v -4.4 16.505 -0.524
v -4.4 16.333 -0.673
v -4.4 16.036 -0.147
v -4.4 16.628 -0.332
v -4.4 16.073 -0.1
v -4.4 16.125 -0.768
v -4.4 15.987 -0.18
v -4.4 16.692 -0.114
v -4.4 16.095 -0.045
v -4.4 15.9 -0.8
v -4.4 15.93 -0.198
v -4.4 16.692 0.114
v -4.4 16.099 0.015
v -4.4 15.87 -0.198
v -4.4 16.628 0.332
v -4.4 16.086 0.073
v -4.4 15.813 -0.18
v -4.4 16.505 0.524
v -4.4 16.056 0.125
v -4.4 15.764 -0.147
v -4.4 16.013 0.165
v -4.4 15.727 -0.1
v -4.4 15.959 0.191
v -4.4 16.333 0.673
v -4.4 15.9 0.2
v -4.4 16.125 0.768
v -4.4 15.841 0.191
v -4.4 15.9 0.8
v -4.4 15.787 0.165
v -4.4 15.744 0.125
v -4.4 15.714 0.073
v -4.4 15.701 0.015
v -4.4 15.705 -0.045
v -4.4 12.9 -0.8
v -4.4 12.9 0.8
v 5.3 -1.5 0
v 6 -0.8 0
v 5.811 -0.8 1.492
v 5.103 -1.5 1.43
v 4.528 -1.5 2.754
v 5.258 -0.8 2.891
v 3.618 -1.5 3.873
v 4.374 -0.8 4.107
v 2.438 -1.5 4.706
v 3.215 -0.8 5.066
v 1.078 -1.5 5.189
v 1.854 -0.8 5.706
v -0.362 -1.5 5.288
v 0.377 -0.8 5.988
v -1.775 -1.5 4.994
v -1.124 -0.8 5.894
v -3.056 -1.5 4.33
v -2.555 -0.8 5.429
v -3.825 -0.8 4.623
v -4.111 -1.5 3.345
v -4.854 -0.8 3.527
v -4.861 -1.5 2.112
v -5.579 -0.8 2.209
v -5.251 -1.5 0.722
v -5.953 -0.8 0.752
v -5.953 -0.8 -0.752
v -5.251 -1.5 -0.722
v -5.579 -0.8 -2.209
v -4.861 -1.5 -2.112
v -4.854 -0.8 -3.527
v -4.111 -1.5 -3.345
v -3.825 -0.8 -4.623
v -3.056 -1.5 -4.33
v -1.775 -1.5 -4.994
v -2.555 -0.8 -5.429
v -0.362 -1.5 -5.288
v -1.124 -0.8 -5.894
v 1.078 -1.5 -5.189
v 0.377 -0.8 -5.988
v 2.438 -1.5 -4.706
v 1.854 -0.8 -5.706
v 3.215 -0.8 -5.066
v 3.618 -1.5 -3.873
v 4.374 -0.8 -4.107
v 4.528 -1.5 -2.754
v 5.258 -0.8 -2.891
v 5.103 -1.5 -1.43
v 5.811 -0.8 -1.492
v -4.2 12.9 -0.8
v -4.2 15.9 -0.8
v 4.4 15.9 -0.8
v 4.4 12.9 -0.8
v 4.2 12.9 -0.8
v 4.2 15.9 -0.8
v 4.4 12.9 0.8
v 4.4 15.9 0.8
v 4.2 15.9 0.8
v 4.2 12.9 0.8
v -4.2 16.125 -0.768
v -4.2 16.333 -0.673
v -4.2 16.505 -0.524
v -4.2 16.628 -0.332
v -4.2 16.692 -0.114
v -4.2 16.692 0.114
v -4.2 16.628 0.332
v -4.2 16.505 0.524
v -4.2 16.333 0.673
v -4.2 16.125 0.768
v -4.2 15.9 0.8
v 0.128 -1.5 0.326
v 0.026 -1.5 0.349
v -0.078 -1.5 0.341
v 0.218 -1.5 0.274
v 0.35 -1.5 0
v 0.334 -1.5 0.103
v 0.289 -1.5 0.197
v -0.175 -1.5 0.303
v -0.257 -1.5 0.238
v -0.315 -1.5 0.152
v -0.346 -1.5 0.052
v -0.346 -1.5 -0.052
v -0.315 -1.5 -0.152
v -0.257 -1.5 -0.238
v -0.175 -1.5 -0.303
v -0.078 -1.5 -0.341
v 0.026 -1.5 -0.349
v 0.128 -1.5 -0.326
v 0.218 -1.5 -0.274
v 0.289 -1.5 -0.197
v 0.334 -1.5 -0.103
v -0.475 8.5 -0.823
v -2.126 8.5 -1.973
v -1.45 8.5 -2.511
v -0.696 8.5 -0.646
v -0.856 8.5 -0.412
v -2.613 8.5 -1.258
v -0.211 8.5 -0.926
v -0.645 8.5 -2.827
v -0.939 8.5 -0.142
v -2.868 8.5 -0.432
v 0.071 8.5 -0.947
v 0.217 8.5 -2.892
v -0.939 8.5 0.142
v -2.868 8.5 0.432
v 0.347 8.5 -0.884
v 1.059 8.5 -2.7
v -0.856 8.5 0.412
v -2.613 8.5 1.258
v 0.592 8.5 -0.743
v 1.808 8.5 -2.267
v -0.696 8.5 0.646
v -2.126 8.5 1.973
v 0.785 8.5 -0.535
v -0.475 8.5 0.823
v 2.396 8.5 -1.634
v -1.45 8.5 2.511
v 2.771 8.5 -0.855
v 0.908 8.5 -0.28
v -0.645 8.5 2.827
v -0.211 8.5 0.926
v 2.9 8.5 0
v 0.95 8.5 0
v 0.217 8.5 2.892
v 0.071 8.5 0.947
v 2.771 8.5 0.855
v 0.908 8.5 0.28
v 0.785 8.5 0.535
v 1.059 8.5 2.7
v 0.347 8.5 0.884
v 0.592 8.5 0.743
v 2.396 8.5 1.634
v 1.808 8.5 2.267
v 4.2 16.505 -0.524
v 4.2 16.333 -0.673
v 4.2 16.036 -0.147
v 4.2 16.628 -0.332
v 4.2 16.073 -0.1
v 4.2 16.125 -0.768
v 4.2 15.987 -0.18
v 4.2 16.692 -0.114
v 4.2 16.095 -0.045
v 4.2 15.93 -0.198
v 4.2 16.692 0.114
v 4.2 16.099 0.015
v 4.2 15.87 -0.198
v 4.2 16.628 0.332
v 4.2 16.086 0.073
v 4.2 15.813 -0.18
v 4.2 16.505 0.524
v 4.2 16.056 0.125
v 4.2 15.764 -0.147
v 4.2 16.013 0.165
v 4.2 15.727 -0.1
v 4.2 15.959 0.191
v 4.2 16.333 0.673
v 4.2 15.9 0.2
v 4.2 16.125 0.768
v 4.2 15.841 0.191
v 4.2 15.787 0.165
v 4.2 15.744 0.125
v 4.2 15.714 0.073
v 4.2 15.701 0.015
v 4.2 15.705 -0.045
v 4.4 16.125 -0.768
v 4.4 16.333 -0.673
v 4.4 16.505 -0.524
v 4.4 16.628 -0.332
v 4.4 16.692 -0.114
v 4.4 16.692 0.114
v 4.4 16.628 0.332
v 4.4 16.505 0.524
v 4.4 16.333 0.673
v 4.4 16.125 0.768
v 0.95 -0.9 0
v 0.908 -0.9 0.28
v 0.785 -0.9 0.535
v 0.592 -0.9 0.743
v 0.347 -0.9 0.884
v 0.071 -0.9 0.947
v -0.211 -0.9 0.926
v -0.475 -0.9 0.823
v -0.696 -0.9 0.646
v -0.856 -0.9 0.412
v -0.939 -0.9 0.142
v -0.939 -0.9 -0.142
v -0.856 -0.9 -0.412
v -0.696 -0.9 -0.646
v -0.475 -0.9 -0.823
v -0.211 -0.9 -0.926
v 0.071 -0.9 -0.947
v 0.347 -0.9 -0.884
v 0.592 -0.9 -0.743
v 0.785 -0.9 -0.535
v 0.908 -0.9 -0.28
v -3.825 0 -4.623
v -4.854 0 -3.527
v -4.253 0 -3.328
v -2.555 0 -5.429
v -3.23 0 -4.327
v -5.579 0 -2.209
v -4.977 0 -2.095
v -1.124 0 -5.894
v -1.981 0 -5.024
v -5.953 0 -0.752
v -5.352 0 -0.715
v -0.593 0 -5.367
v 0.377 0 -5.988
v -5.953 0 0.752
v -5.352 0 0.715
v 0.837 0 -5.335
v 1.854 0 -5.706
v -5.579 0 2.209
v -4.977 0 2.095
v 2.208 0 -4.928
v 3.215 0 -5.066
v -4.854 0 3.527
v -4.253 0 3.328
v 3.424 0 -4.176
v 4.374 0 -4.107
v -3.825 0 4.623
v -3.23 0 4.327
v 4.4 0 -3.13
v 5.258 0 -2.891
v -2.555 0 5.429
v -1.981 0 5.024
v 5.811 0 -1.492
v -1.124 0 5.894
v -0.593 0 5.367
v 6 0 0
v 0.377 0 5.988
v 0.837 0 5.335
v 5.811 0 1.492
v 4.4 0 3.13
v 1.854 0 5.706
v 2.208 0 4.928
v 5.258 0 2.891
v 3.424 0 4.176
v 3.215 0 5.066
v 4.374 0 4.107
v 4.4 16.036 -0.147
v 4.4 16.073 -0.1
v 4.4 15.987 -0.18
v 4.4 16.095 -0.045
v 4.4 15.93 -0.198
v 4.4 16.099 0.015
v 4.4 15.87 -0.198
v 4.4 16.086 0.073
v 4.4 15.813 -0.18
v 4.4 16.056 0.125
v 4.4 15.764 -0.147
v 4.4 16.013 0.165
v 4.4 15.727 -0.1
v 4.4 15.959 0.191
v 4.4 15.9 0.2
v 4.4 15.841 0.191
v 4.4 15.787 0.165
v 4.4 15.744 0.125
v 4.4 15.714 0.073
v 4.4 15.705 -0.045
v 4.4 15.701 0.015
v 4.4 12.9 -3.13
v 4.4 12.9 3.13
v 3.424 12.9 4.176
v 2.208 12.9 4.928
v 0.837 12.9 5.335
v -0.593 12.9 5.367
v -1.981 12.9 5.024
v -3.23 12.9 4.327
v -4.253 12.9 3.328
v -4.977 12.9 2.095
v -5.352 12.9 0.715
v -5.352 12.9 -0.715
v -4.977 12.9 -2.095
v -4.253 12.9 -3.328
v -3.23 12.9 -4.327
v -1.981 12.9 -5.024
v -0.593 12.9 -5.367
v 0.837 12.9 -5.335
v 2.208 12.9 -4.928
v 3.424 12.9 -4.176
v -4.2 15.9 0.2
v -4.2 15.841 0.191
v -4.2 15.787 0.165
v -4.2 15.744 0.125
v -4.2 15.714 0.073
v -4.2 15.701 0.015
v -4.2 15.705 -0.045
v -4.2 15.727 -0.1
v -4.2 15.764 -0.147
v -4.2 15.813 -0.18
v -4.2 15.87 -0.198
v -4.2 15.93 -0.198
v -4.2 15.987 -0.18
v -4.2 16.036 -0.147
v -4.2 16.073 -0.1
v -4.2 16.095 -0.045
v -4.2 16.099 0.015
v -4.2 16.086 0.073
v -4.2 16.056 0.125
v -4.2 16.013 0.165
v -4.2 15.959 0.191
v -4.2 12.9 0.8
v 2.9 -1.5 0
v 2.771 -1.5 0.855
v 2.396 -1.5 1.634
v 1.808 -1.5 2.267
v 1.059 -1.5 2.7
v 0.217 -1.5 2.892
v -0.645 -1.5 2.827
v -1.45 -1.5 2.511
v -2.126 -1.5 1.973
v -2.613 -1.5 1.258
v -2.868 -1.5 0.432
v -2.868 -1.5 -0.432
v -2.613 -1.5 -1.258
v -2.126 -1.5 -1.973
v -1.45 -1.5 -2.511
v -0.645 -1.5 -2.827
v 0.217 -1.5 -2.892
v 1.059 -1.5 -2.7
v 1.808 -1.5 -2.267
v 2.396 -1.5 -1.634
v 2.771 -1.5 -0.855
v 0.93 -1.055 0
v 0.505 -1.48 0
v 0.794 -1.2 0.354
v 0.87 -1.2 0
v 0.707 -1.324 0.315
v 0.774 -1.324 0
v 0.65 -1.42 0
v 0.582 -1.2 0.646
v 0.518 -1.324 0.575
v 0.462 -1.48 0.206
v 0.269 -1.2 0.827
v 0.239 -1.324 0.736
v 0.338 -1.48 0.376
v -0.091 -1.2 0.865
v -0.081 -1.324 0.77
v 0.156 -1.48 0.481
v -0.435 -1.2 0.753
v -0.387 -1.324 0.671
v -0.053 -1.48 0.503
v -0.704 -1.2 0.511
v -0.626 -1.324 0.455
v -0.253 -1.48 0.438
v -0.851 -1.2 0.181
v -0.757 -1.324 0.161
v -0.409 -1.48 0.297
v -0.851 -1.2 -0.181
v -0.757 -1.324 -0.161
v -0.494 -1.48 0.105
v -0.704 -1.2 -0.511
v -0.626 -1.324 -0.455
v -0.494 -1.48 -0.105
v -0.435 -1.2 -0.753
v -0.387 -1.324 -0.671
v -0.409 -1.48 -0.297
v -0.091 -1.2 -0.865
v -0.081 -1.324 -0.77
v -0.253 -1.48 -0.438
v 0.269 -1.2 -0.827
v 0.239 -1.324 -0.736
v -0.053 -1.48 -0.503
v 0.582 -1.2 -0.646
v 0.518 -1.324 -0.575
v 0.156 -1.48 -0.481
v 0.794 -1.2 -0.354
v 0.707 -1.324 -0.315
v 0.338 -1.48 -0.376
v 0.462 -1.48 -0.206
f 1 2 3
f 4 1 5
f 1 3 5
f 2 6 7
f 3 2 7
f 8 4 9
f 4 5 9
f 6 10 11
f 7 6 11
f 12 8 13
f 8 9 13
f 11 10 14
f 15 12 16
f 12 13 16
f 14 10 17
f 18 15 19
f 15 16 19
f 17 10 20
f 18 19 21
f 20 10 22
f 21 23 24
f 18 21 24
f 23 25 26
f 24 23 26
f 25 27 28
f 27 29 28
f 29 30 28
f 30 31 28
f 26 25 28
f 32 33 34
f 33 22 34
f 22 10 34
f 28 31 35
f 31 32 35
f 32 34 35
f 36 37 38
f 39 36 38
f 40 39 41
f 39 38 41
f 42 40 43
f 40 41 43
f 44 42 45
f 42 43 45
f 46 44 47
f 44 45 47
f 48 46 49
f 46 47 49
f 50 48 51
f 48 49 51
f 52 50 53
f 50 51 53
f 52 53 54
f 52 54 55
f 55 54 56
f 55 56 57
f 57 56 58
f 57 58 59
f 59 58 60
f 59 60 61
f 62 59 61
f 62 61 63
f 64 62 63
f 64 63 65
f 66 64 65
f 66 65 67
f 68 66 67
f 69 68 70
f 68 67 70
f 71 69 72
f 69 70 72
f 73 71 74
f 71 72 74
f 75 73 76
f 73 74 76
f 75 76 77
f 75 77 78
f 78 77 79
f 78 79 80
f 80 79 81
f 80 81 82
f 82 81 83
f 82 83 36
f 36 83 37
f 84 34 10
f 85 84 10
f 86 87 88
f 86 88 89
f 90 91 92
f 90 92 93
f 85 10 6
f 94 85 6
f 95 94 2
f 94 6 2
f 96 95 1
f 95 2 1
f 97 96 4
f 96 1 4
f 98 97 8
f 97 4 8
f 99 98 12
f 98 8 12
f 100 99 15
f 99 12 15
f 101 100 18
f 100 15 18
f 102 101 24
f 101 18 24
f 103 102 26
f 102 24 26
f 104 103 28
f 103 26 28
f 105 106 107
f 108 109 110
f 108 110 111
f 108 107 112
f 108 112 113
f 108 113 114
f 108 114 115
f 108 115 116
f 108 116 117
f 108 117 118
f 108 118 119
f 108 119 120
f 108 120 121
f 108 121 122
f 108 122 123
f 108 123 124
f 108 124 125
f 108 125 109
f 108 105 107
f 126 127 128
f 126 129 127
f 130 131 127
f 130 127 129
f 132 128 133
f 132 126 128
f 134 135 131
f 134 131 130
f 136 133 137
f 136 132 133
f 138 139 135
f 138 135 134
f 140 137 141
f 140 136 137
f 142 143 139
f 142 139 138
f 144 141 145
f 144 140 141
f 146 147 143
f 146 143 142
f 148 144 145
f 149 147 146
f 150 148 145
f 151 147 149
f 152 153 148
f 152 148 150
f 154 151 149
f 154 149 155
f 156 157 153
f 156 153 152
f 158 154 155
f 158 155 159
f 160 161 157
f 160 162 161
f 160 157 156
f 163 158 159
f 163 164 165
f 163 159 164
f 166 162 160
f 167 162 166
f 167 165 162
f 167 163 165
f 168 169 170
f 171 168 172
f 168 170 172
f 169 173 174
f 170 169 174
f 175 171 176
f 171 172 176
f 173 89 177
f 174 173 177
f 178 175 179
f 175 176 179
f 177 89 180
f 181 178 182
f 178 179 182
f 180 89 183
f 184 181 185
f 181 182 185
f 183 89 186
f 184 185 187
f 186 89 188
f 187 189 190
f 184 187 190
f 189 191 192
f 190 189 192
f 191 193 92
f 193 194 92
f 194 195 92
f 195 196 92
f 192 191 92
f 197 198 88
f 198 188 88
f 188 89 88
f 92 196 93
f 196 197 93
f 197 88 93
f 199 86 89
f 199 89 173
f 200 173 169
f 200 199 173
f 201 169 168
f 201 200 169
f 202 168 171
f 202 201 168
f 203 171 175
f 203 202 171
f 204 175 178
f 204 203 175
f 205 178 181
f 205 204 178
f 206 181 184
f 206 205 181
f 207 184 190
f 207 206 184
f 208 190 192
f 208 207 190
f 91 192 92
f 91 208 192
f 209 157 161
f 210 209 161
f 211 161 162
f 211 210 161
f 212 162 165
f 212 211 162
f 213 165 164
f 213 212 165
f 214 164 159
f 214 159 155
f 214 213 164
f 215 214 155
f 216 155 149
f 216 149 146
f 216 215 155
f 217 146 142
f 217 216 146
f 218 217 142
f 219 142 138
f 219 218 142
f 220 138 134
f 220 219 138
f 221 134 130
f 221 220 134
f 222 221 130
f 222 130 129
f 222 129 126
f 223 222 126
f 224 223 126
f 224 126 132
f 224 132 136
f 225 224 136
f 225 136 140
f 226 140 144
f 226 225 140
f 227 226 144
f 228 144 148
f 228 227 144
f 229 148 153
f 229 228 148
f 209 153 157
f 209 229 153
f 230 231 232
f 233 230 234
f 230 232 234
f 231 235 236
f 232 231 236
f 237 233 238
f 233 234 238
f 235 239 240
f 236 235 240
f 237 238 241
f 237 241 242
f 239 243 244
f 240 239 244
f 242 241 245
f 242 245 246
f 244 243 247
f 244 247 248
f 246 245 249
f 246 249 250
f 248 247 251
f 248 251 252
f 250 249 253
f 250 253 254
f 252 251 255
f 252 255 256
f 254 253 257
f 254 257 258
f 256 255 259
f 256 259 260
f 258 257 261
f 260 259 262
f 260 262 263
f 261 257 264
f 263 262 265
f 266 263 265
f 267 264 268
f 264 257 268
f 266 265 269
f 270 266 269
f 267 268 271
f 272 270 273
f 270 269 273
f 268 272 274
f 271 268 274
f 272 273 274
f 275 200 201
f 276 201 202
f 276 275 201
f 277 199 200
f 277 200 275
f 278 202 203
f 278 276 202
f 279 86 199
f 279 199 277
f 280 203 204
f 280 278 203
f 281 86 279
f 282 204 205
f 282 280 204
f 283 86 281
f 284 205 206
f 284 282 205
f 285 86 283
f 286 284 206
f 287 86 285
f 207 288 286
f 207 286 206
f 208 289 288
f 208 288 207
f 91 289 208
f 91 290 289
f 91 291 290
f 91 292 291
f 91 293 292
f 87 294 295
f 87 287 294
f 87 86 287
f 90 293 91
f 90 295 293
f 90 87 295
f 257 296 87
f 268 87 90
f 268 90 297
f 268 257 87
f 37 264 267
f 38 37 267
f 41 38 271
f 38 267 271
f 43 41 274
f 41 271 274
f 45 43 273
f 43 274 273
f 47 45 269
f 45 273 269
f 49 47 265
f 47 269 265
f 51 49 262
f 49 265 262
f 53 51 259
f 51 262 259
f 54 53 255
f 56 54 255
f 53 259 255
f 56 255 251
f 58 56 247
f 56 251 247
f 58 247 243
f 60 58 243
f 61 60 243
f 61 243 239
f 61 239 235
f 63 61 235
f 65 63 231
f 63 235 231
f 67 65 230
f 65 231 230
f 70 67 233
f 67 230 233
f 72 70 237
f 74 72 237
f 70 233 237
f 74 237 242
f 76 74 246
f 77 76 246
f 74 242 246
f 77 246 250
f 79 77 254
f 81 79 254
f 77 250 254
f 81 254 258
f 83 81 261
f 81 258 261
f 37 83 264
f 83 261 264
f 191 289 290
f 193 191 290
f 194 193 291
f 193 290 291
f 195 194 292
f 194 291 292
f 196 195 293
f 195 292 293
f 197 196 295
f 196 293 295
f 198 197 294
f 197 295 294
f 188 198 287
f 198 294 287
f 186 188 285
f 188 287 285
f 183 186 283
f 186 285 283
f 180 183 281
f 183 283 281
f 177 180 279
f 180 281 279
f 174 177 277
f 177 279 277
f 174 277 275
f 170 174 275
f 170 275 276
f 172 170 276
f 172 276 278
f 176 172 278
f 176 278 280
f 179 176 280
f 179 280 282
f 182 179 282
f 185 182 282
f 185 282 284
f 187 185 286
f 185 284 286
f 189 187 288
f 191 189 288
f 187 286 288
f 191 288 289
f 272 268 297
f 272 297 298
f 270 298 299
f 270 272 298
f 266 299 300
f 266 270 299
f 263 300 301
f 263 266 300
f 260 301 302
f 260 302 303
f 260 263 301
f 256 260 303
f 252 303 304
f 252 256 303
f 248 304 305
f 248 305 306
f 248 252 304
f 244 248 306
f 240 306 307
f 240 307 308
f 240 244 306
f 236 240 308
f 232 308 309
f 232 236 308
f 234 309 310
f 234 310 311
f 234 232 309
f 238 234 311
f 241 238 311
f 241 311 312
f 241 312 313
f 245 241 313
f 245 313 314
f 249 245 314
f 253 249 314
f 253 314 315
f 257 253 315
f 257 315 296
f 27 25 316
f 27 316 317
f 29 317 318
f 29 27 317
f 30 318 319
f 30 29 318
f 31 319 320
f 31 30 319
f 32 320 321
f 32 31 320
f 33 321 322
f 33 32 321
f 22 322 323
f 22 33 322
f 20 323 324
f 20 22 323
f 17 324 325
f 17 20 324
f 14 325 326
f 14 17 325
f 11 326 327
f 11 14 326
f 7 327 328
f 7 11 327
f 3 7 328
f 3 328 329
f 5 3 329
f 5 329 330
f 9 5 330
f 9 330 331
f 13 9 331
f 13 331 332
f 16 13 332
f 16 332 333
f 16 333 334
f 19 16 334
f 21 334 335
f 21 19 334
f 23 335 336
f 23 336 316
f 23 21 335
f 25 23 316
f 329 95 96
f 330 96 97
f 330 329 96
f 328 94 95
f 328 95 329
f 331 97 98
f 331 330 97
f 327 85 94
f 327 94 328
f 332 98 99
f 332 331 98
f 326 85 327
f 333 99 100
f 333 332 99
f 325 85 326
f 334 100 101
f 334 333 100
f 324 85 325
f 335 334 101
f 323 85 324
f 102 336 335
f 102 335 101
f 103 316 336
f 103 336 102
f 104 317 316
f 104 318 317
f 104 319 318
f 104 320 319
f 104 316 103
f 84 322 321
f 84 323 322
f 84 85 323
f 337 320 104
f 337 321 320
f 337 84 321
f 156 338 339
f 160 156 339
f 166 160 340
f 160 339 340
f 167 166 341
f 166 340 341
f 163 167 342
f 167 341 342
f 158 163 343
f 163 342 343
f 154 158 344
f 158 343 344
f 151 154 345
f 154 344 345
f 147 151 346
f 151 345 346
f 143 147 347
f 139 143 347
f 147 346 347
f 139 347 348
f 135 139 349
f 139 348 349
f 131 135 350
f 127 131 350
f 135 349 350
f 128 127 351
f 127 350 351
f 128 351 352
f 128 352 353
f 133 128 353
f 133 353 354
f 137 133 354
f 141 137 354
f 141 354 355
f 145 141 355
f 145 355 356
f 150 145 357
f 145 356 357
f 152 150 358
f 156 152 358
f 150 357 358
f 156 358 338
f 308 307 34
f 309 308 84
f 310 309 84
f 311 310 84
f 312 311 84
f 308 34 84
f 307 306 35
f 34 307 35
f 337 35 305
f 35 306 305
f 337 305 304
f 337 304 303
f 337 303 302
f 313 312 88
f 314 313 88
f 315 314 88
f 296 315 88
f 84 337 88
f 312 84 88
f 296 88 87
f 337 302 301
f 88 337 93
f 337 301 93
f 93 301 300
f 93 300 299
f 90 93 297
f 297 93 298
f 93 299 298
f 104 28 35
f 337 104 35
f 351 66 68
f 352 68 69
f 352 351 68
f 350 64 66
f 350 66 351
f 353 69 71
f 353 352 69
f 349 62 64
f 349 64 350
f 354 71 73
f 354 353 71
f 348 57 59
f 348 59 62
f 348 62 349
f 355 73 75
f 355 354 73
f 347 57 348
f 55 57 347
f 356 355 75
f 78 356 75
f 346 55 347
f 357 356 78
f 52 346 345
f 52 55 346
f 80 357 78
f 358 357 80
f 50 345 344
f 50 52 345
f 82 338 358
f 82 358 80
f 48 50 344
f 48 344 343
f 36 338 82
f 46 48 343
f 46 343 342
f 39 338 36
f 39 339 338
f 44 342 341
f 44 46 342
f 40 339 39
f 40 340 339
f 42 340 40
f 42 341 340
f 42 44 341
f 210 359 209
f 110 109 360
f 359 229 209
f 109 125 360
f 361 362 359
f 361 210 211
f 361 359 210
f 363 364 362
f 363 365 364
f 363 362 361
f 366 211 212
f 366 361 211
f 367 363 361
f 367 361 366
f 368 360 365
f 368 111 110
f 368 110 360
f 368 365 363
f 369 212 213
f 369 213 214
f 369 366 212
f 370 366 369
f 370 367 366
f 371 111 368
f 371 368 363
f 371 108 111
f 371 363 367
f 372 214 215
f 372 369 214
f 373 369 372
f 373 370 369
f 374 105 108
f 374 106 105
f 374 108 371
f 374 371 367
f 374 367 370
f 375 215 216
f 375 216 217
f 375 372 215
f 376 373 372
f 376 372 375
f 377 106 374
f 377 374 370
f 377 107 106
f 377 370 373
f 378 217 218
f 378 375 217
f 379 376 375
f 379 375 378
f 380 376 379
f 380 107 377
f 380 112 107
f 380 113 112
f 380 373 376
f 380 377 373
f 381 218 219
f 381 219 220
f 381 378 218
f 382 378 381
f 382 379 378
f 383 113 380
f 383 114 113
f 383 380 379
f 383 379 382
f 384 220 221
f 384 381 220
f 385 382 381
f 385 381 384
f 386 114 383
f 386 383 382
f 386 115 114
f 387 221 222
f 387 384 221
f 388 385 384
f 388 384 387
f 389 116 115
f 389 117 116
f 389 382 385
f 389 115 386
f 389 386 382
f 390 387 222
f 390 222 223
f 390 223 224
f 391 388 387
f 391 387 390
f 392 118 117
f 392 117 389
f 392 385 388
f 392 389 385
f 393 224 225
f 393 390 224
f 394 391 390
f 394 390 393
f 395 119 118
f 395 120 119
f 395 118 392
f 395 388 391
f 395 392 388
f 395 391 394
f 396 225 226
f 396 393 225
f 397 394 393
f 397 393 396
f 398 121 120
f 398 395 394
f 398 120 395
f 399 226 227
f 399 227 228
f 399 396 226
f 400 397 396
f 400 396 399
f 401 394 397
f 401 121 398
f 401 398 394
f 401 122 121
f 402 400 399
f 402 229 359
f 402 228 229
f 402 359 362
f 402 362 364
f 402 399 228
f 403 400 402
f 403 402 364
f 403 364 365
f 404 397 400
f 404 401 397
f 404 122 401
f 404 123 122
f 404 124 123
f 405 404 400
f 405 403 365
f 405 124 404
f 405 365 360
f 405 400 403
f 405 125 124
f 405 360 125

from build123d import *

# Parameters (mm, degrees)
PAD_DEPTH     = 12.9
SKETCH001_R   = 6
PAD001_DEPTH  = 1.5
SKETCH002_R   = 2.9
SKETCH002_R_2 = 0.95
POCKET_DEPTH  = 10
FILLET_R      = 0.6
CHAMFER_SIZE  = 0.7
SKETCH003_R   = 0.2
PAD002_DEPTH  = 0.2


with BuildPart() as part:
    # Sketch → Pad (new body)
    with BuildSketch(Plane.XZ):
        with BuildLine():
            Line((4.4, -3.130495), (4.4, 3.130495))
            ThreePointArc((4.4, 3.130495), (-5.4, 0), (4.4, -3.130495))
        make_face()
    extrude(amount=-PAD_DEPTH)

    # Sketch001 (on Face3 of Pad) → Pad001 (join)
    with BuildSketch(Plane.XZ):
        Circle(SKETCH001_R)
    extrude(amount=PAD001_DEPTH)

    # Sketch002 (on Face3 of Pad001) → Pocket (cut)
    with BuildSketch(Plane.XZ.offset(1.5)):
        Circle(SKETCH002_R)
        Circle(SKETCH002_R_2, mode=Mode.SUBTRACT)
    extrude(amount=-POCKET_DEPTH, mode=Mode.SUBTRACT)

    # Fillet
    fillet_edges = [part.edges().sort_by_distance(p)[0] for p in [
        (-0.95, -1.5, 0),
    ]]
    fillet(fillet_edges, radius=FILLET_R)

    # Chamfer
    chamfer_edges = [part.edges().sort_by_distance(p)[0] for p in [
        (-6, -1.5, 0),
    ]]
    chamfer(chamfer_edges, length=CHAMFER_SIZE)

    # Sketch003 (on Face8 of Chamfer) → Pad002 (join)
    with BuildSketch(Plane(origin=(4.4, 0, 0), x_dir=(0, 0, 1), z_dir=(1, 0, 0))):
        with BuildLine():
            Line((0.8, -12.9), (-0.8, -12.9))
            Line((-0.8, -12.9), (-0.8, -15.9))
            ThreePointArc((-0.8, -15.9), (0, -16.7), (0.8, -15.9))
            Line((0.8, -15.9), (0.8, -12.9))
        make_face()
        with Locations((0, -15.9)):
            Circle(SKETCH003_R, mode=Mode.SUBTRACT)
    pad002 = extrude(amount=-PAD002_DEPTH)

    # Mirrored: Pad002 across YZ
    add(pad002.mirror(Plane.YZ))


solid = part.part
